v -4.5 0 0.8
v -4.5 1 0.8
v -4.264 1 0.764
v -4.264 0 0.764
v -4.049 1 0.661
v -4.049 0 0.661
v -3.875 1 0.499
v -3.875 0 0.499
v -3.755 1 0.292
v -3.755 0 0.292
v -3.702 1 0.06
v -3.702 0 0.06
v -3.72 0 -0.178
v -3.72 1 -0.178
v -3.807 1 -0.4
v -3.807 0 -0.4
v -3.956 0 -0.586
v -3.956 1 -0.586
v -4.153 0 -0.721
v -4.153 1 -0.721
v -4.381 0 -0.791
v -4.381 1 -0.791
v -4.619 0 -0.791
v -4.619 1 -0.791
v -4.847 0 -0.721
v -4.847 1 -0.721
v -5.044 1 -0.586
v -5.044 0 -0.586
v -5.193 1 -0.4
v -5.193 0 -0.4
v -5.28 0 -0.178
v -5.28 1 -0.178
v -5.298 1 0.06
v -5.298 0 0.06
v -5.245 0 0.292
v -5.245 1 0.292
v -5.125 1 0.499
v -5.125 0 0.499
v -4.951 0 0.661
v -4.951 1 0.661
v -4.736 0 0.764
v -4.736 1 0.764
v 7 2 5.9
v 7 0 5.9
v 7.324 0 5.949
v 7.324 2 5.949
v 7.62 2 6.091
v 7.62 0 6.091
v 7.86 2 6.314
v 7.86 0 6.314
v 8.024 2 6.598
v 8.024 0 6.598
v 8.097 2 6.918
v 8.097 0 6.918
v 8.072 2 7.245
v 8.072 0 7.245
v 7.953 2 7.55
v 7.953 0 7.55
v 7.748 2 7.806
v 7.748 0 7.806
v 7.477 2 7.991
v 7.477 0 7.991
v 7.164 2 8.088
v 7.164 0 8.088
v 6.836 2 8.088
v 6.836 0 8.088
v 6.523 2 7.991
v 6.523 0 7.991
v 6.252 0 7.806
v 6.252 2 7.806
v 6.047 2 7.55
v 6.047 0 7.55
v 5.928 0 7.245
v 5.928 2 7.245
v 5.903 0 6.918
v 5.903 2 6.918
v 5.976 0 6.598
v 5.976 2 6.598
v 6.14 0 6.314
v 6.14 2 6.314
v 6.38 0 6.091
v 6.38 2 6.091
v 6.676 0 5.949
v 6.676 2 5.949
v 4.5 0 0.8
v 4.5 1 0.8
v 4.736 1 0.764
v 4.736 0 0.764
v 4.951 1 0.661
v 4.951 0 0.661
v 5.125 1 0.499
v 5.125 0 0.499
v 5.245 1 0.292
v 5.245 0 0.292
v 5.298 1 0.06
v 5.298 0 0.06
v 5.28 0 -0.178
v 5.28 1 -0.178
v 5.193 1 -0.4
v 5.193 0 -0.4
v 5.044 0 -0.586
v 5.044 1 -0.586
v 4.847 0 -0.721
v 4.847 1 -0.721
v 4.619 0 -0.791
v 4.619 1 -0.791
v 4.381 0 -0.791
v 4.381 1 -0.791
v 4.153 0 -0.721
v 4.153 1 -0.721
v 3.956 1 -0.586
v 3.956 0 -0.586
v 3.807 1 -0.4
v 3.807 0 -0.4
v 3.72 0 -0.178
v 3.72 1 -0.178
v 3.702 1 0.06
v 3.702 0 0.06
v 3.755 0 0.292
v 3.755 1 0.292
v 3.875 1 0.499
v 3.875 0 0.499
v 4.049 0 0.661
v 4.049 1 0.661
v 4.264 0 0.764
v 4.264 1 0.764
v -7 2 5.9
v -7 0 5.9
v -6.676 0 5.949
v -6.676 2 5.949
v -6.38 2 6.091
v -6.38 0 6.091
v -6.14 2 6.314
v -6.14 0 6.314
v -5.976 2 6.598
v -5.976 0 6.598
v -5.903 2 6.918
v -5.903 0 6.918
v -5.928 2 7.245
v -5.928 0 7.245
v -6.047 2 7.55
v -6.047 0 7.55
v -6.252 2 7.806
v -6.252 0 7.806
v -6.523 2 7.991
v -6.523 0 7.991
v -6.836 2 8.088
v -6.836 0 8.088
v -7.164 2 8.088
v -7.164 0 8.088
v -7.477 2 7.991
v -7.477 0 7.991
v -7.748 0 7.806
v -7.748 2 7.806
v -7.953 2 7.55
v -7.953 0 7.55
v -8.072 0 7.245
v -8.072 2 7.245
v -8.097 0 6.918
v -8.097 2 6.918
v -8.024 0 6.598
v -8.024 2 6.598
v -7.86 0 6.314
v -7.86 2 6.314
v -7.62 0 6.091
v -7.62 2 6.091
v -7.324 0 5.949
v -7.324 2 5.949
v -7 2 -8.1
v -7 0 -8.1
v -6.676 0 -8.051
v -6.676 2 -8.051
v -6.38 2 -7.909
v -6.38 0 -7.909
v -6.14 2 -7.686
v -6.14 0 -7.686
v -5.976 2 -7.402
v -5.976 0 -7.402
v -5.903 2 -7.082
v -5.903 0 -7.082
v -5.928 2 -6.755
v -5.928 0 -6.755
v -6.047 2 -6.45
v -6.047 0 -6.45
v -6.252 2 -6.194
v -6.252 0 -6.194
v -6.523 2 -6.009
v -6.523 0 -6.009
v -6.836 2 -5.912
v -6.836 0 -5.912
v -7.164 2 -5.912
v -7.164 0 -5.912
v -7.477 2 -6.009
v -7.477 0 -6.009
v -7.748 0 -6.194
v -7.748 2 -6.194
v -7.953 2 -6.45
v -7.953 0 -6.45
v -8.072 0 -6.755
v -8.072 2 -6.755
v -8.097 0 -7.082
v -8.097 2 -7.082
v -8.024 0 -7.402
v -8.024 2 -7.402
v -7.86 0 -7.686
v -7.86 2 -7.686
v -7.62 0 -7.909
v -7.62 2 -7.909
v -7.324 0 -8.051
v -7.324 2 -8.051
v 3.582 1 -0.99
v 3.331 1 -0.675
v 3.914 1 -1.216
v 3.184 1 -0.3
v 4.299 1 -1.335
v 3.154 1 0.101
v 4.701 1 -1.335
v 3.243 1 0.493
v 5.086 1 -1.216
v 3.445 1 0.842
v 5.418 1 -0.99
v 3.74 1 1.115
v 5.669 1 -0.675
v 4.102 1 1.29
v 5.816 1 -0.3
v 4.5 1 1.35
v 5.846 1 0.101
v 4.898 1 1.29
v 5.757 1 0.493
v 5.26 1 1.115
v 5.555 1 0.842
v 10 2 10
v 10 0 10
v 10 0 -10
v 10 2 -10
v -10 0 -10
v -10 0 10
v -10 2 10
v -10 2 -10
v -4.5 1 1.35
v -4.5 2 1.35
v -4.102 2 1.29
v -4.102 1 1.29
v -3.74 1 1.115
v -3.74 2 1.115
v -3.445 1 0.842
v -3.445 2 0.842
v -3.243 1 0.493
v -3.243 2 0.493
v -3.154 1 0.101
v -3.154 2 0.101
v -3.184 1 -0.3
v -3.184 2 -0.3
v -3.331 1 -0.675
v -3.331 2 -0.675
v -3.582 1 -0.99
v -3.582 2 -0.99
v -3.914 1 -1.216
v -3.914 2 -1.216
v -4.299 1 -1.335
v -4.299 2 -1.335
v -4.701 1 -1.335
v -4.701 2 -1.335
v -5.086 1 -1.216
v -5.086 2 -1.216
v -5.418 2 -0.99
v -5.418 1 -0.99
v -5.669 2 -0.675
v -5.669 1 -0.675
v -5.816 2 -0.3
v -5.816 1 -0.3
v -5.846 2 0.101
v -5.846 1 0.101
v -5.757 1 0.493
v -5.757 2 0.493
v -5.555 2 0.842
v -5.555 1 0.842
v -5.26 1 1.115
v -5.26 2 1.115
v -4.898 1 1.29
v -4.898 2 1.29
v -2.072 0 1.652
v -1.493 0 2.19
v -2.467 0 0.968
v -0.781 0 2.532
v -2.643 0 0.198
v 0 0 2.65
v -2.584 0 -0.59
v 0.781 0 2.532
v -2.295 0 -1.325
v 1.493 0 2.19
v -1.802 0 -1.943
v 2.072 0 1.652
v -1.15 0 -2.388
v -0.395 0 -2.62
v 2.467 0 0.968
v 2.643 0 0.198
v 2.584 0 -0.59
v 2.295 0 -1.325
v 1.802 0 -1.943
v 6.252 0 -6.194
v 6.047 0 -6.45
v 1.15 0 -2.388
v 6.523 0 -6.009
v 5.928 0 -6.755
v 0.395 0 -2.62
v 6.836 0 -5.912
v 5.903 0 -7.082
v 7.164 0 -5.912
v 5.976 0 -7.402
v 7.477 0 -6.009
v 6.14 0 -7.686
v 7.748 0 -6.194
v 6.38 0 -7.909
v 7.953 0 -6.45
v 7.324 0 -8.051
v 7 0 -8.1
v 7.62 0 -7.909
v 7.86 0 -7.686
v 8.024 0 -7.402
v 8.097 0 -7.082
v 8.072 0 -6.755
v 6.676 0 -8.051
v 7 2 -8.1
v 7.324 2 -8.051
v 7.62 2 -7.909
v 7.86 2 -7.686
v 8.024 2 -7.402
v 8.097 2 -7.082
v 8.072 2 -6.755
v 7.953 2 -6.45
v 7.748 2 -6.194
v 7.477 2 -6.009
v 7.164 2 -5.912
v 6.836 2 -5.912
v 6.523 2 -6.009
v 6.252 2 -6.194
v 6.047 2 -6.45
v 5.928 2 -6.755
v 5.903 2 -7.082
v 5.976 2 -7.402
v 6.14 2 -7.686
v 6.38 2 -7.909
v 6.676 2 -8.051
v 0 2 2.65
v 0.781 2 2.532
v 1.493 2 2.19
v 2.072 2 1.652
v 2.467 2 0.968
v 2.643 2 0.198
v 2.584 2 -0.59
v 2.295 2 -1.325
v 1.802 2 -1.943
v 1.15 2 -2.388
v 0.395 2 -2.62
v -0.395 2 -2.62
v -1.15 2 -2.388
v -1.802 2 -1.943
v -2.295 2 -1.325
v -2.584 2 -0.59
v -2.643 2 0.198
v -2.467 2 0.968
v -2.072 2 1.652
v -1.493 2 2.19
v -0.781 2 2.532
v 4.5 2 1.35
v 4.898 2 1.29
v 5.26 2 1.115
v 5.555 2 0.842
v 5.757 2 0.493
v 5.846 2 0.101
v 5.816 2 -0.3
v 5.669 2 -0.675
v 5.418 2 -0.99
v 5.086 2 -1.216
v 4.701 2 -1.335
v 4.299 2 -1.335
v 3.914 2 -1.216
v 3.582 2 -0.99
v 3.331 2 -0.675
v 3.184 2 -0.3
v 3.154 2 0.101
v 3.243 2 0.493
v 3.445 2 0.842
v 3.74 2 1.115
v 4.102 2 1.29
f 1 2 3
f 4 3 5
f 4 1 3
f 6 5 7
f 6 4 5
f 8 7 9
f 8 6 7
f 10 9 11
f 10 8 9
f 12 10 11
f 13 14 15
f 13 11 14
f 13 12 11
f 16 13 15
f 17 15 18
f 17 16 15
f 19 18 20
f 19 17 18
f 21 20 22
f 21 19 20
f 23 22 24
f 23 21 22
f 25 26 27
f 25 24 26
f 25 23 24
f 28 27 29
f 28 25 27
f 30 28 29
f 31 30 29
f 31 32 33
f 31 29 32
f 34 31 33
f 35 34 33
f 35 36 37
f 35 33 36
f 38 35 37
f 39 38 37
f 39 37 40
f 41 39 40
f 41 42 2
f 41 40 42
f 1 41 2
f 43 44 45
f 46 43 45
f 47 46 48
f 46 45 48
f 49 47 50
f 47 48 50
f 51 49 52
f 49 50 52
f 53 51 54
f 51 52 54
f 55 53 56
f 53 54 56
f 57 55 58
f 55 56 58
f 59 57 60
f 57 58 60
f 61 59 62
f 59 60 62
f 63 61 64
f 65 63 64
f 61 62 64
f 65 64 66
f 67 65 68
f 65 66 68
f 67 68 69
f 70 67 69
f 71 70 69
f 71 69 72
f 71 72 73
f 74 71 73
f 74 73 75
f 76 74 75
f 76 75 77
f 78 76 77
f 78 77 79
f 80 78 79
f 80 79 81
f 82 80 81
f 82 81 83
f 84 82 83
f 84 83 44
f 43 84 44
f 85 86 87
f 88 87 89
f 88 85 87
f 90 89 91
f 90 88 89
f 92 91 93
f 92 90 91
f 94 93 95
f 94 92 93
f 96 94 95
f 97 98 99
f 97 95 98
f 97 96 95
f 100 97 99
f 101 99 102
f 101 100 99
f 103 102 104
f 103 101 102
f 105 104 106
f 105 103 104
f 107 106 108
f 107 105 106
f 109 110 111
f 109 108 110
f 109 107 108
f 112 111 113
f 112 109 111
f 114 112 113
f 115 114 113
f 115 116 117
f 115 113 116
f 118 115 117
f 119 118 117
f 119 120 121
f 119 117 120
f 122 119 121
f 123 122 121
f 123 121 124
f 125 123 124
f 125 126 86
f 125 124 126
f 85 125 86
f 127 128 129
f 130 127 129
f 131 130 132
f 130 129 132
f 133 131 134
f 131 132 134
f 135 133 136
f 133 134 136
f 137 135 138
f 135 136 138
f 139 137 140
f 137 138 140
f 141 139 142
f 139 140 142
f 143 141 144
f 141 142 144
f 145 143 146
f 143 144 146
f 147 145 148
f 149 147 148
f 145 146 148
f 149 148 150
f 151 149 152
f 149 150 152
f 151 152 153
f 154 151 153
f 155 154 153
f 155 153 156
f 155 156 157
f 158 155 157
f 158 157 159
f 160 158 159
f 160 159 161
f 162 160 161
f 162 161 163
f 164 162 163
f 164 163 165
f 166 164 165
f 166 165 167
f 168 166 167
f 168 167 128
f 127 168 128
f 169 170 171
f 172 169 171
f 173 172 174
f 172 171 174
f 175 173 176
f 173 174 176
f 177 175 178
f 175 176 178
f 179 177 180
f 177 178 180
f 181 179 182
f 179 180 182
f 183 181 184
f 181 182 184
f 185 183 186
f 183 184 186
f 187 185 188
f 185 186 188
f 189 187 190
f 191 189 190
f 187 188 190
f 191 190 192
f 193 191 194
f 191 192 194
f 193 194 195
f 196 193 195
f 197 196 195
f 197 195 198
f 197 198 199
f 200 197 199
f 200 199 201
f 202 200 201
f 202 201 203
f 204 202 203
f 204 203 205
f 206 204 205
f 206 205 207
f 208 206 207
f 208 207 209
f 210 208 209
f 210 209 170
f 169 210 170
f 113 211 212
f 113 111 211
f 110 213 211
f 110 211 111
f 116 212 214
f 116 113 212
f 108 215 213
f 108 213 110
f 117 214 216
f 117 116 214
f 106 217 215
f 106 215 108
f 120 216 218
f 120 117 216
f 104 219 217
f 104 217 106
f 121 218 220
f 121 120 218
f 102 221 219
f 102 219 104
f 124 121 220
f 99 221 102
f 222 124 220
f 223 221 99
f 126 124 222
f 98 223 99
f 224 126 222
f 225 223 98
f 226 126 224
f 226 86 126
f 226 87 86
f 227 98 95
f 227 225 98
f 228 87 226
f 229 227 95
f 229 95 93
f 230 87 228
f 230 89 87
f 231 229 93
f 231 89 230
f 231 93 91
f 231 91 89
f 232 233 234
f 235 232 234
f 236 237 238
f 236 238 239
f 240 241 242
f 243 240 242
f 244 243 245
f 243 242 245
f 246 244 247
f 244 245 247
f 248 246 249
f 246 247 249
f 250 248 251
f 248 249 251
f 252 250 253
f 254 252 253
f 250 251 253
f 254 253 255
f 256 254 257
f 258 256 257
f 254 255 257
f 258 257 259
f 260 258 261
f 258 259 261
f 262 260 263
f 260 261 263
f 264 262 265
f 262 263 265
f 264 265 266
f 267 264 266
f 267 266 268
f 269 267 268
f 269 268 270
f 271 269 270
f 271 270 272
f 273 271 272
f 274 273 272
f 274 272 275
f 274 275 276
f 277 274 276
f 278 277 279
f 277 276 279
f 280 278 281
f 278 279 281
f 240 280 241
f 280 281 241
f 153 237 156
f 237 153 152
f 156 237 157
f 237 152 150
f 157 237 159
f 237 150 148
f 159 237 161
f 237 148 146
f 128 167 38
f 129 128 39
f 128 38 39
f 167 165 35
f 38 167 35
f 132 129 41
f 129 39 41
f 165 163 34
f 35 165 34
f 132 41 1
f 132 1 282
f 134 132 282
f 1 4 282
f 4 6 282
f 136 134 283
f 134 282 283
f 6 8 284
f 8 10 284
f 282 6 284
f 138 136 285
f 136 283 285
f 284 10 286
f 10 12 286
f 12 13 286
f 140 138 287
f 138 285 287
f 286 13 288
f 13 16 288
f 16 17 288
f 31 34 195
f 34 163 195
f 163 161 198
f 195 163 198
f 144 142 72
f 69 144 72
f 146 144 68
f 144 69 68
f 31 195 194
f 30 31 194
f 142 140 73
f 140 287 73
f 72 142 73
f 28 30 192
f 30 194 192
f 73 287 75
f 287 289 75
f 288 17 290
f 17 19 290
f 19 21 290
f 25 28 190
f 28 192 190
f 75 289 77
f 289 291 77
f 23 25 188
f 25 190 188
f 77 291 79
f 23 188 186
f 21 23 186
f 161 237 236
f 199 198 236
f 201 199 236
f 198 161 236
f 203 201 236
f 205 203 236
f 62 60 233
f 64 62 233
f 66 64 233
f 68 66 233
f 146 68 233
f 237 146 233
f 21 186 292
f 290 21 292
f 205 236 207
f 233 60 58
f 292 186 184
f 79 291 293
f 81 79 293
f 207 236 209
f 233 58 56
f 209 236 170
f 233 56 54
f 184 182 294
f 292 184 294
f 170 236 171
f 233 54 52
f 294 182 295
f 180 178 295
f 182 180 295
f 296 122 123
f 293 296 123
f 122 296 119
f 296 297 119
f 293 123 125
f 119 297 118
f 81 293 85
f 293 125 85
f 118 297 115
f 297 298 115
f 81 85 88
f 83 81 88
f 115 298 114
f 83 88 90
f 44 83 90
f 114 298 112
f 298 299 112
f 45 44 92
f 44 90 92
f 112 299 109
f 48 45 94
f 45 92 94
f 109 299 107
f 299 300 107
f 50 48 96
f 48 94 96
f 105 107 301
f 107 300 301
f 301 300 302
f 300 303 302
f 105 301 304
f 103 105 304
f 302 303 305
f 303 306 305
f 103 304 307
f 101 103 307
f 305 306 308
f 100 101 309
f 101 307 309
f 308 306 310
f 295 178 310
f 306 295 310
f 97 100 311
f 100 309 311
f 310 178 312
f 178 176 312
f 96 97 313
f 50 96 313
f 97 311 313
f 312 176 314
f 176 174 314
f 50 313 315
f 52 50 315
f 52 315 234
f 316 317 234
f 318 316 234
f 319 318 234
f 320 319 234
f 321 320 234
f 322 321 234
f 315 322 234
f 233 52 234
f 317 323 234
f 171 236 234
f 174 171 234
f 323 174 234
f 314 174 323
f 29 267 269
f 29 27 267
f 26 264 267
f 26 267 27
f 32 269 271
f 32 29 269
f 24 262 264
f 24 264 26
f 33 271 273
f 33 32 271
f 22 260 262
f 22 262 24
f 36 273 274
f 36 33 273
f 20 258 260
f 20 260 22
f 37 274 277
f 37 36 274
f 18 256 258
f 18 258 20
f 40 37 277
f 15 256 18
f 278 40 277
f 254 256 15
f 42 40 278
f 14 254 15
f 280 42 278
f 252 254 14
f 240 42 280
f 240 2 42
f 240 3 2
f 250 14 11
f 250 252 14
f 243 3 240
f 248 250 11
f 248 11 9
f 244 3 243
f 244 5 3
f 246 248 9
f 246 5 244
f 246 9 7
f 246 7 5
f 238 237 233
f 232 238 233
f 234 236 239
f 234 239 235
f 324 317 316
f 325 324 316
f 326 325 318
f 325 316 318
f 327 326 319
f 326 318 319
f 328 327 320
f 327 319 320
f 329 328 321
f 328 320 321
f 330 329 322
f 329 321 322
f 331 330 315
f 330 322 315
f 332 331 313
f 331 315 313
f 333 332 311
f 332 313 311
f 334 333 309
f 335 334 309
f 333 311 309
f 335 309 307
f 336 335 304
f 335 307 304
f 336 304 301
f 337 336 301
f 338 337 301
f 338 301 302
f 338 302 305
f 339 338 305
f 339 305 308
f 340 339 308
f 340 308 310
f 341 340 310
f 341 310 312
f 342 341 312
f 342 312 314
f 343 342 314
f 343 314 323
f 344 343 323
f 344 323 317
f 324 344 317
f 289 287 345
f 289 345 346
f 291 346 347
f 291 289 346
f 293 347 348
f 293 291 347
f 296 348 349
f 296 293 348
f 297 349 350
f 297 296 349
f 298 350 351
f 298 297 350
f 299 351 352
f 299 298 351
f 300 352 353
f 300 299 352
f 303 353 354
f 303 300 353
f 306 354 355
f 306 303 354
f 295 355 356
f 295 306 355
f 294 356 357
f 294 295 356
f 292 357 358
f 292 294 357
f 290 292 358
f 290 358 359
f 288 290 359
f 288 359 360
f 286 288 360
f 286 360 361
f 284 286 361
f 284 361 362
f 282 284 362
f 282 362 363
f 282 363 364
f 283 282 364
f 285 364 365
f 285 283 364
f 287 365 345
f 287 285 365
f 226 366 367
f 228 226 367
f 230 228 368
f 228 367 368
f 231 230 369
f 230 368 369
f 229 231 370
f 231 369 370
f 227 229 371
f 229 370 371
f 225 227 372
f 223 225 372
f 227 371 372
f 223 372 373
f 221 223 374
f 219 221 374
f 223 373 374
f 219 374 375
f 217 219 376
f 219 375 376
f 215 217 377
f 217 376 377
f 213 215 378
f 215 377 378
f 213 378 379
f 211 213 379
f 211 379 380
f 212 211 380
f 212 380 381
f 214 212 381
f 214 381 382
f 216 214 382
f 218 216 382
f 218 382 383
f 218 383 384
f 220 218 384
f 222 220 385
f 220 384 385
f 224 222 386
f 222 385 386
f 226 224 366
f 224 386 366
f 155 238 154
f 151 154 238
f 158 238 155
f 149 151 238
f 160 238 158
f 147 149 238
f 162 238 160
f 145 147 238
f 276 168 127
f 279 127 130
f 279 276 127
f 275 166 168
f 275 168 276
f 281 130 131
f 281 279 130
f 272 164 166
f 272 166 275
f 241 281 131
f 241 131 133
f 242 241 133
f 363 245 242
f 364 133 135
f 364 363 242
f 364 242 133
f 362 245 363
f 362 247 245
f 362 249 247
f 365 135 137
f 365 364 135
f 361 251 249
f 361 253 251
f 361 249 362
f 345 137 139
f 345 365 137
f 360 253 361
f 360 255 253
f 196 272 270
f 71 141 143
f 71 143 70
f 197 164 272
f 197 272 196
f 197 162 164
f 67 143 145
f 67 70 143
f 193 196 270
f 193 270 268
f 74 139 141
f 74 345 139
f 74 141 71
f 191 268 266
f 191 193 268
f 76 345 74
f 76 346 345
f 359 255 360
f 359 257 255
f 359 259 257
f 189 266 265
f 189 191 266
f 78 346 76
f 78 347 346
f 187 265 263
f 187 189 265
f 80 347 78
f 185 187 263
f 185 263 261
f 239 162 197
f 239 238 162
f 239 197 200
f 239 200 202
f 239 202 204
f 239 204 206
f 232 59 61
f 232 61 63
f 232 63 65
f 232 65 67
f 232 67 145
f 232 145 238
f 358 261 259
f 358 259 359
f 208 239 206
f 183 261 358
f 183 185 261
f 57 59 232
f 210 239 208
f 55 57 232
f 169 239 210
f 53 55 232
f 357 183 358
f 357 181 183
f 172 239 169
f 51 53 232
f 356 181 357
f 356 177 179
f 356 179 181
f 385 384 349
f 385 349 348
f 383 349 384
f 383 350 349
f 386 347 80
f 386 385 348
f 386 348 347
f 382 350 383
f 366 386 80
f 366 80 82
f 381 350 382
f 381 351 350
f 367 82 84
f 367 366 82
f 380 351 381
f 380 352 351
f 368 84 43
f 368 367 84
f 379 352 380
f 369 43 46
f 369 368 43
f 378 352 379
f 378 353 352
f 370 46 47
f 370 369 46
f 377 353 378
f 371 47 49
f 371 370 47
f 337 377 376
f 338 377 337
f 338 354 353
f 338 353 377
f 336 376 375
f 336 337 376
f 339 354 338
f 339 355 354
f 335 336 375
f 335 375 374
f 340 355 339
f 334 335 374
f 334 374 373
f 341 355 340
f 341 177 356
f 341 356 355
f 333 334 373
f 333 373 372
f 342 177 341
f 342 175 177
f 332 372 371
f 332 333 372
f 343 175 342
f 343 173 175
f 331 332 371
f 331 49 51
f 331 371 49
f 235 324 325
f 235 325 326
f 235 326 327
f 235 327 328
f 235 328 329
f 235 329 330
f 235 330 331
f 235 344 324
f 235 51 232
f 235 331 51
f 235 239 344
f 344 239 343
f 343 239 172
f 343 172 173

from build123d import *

# Parameters (mm, degrees)
SKETCH_1_W          = 20
SKETCH_1_H          = 20
SKETCH_1_R          = 0.8
SKETCH_1_R_2        = 2.65
EXTRUDE_1_DEPTH     = 2
SKETCH_2_R          = 1.35
CUT_EXTRUDE_1_DEPTH = 1
SKETCH_3_R          = 1.1
CUT_EXTRUDE_2_DEPTH = 15.282856857


with BuildPart() as part:
    # 草图1 → 凸台-拉伸1 (new body)
    with BuildSketch(Plane(origin=(0, 0, 0), x_dir=(1, 0, 0), z_dir=(0, 1, 0))):
        Rectangle(SKETCH_1_W, SKETCH_1_H)
        with Locations(Location((-4.5, 0, 0), (0, 0, 270))):
            Circle(SKETCH_1_R, mode=Mode.SUBTRACT)
        with Locations(Location((4.5, 0, 0), (0, 0, 270))):
            Circle(SKETCH_1_R, mode=Mode.SUBTRACT)
        with Locations(Location((0, 0, 0), (0, 0, 270))):
            Circle(SKETCH_1_R_2, mode=Mode.SUBTRACT)
    extrude(amount=EXTRUDE_1_DEPTH)

    # 草图2 → 切除-拉伸1 (cut)
    with BuildSketch(Plane(origin=(0, 2, 0), x_dir=(1, 0, 0), z_dir=(0, 1, 0))):
        with Locations(Location((-4.5, 0, 0), (0, 0, 270))):
            Circle(SKETCH_2_R)
        with Locations(Location((4.5, 0, 0), (0, 0, 270))):
            Circle(SKETCH_2_R)
    extrude(amount=-CUT_EXTRUDE_1_DEPTH, mode=Mode.SUBTRACT)

    # 草图3 → 切除-拉伸2 (cut, through all)
    with BuildSketch(Plane.XZ):
        with Locations(Location((-7, 7, 0), (0, 0, 270))):
            Circle(SKETCH_3_R)
        with Locations(Location((7, 7, 0), (0, 0, 270))):
            Circle(SKETCH_3_R)
        with Locations(Location((7, -7, 0), (0, 0, 270))):
            Circle(SKETCH_3_R)
        with Locations(Location((-7, -7, 0), (0, 0, 270))):
            Circle(SKETCH_3_R)
    extrude(amount=-CUT_EXTRUDE_2_DEPTH, mode=Mode.SUBTRACT)


solid = part.part
